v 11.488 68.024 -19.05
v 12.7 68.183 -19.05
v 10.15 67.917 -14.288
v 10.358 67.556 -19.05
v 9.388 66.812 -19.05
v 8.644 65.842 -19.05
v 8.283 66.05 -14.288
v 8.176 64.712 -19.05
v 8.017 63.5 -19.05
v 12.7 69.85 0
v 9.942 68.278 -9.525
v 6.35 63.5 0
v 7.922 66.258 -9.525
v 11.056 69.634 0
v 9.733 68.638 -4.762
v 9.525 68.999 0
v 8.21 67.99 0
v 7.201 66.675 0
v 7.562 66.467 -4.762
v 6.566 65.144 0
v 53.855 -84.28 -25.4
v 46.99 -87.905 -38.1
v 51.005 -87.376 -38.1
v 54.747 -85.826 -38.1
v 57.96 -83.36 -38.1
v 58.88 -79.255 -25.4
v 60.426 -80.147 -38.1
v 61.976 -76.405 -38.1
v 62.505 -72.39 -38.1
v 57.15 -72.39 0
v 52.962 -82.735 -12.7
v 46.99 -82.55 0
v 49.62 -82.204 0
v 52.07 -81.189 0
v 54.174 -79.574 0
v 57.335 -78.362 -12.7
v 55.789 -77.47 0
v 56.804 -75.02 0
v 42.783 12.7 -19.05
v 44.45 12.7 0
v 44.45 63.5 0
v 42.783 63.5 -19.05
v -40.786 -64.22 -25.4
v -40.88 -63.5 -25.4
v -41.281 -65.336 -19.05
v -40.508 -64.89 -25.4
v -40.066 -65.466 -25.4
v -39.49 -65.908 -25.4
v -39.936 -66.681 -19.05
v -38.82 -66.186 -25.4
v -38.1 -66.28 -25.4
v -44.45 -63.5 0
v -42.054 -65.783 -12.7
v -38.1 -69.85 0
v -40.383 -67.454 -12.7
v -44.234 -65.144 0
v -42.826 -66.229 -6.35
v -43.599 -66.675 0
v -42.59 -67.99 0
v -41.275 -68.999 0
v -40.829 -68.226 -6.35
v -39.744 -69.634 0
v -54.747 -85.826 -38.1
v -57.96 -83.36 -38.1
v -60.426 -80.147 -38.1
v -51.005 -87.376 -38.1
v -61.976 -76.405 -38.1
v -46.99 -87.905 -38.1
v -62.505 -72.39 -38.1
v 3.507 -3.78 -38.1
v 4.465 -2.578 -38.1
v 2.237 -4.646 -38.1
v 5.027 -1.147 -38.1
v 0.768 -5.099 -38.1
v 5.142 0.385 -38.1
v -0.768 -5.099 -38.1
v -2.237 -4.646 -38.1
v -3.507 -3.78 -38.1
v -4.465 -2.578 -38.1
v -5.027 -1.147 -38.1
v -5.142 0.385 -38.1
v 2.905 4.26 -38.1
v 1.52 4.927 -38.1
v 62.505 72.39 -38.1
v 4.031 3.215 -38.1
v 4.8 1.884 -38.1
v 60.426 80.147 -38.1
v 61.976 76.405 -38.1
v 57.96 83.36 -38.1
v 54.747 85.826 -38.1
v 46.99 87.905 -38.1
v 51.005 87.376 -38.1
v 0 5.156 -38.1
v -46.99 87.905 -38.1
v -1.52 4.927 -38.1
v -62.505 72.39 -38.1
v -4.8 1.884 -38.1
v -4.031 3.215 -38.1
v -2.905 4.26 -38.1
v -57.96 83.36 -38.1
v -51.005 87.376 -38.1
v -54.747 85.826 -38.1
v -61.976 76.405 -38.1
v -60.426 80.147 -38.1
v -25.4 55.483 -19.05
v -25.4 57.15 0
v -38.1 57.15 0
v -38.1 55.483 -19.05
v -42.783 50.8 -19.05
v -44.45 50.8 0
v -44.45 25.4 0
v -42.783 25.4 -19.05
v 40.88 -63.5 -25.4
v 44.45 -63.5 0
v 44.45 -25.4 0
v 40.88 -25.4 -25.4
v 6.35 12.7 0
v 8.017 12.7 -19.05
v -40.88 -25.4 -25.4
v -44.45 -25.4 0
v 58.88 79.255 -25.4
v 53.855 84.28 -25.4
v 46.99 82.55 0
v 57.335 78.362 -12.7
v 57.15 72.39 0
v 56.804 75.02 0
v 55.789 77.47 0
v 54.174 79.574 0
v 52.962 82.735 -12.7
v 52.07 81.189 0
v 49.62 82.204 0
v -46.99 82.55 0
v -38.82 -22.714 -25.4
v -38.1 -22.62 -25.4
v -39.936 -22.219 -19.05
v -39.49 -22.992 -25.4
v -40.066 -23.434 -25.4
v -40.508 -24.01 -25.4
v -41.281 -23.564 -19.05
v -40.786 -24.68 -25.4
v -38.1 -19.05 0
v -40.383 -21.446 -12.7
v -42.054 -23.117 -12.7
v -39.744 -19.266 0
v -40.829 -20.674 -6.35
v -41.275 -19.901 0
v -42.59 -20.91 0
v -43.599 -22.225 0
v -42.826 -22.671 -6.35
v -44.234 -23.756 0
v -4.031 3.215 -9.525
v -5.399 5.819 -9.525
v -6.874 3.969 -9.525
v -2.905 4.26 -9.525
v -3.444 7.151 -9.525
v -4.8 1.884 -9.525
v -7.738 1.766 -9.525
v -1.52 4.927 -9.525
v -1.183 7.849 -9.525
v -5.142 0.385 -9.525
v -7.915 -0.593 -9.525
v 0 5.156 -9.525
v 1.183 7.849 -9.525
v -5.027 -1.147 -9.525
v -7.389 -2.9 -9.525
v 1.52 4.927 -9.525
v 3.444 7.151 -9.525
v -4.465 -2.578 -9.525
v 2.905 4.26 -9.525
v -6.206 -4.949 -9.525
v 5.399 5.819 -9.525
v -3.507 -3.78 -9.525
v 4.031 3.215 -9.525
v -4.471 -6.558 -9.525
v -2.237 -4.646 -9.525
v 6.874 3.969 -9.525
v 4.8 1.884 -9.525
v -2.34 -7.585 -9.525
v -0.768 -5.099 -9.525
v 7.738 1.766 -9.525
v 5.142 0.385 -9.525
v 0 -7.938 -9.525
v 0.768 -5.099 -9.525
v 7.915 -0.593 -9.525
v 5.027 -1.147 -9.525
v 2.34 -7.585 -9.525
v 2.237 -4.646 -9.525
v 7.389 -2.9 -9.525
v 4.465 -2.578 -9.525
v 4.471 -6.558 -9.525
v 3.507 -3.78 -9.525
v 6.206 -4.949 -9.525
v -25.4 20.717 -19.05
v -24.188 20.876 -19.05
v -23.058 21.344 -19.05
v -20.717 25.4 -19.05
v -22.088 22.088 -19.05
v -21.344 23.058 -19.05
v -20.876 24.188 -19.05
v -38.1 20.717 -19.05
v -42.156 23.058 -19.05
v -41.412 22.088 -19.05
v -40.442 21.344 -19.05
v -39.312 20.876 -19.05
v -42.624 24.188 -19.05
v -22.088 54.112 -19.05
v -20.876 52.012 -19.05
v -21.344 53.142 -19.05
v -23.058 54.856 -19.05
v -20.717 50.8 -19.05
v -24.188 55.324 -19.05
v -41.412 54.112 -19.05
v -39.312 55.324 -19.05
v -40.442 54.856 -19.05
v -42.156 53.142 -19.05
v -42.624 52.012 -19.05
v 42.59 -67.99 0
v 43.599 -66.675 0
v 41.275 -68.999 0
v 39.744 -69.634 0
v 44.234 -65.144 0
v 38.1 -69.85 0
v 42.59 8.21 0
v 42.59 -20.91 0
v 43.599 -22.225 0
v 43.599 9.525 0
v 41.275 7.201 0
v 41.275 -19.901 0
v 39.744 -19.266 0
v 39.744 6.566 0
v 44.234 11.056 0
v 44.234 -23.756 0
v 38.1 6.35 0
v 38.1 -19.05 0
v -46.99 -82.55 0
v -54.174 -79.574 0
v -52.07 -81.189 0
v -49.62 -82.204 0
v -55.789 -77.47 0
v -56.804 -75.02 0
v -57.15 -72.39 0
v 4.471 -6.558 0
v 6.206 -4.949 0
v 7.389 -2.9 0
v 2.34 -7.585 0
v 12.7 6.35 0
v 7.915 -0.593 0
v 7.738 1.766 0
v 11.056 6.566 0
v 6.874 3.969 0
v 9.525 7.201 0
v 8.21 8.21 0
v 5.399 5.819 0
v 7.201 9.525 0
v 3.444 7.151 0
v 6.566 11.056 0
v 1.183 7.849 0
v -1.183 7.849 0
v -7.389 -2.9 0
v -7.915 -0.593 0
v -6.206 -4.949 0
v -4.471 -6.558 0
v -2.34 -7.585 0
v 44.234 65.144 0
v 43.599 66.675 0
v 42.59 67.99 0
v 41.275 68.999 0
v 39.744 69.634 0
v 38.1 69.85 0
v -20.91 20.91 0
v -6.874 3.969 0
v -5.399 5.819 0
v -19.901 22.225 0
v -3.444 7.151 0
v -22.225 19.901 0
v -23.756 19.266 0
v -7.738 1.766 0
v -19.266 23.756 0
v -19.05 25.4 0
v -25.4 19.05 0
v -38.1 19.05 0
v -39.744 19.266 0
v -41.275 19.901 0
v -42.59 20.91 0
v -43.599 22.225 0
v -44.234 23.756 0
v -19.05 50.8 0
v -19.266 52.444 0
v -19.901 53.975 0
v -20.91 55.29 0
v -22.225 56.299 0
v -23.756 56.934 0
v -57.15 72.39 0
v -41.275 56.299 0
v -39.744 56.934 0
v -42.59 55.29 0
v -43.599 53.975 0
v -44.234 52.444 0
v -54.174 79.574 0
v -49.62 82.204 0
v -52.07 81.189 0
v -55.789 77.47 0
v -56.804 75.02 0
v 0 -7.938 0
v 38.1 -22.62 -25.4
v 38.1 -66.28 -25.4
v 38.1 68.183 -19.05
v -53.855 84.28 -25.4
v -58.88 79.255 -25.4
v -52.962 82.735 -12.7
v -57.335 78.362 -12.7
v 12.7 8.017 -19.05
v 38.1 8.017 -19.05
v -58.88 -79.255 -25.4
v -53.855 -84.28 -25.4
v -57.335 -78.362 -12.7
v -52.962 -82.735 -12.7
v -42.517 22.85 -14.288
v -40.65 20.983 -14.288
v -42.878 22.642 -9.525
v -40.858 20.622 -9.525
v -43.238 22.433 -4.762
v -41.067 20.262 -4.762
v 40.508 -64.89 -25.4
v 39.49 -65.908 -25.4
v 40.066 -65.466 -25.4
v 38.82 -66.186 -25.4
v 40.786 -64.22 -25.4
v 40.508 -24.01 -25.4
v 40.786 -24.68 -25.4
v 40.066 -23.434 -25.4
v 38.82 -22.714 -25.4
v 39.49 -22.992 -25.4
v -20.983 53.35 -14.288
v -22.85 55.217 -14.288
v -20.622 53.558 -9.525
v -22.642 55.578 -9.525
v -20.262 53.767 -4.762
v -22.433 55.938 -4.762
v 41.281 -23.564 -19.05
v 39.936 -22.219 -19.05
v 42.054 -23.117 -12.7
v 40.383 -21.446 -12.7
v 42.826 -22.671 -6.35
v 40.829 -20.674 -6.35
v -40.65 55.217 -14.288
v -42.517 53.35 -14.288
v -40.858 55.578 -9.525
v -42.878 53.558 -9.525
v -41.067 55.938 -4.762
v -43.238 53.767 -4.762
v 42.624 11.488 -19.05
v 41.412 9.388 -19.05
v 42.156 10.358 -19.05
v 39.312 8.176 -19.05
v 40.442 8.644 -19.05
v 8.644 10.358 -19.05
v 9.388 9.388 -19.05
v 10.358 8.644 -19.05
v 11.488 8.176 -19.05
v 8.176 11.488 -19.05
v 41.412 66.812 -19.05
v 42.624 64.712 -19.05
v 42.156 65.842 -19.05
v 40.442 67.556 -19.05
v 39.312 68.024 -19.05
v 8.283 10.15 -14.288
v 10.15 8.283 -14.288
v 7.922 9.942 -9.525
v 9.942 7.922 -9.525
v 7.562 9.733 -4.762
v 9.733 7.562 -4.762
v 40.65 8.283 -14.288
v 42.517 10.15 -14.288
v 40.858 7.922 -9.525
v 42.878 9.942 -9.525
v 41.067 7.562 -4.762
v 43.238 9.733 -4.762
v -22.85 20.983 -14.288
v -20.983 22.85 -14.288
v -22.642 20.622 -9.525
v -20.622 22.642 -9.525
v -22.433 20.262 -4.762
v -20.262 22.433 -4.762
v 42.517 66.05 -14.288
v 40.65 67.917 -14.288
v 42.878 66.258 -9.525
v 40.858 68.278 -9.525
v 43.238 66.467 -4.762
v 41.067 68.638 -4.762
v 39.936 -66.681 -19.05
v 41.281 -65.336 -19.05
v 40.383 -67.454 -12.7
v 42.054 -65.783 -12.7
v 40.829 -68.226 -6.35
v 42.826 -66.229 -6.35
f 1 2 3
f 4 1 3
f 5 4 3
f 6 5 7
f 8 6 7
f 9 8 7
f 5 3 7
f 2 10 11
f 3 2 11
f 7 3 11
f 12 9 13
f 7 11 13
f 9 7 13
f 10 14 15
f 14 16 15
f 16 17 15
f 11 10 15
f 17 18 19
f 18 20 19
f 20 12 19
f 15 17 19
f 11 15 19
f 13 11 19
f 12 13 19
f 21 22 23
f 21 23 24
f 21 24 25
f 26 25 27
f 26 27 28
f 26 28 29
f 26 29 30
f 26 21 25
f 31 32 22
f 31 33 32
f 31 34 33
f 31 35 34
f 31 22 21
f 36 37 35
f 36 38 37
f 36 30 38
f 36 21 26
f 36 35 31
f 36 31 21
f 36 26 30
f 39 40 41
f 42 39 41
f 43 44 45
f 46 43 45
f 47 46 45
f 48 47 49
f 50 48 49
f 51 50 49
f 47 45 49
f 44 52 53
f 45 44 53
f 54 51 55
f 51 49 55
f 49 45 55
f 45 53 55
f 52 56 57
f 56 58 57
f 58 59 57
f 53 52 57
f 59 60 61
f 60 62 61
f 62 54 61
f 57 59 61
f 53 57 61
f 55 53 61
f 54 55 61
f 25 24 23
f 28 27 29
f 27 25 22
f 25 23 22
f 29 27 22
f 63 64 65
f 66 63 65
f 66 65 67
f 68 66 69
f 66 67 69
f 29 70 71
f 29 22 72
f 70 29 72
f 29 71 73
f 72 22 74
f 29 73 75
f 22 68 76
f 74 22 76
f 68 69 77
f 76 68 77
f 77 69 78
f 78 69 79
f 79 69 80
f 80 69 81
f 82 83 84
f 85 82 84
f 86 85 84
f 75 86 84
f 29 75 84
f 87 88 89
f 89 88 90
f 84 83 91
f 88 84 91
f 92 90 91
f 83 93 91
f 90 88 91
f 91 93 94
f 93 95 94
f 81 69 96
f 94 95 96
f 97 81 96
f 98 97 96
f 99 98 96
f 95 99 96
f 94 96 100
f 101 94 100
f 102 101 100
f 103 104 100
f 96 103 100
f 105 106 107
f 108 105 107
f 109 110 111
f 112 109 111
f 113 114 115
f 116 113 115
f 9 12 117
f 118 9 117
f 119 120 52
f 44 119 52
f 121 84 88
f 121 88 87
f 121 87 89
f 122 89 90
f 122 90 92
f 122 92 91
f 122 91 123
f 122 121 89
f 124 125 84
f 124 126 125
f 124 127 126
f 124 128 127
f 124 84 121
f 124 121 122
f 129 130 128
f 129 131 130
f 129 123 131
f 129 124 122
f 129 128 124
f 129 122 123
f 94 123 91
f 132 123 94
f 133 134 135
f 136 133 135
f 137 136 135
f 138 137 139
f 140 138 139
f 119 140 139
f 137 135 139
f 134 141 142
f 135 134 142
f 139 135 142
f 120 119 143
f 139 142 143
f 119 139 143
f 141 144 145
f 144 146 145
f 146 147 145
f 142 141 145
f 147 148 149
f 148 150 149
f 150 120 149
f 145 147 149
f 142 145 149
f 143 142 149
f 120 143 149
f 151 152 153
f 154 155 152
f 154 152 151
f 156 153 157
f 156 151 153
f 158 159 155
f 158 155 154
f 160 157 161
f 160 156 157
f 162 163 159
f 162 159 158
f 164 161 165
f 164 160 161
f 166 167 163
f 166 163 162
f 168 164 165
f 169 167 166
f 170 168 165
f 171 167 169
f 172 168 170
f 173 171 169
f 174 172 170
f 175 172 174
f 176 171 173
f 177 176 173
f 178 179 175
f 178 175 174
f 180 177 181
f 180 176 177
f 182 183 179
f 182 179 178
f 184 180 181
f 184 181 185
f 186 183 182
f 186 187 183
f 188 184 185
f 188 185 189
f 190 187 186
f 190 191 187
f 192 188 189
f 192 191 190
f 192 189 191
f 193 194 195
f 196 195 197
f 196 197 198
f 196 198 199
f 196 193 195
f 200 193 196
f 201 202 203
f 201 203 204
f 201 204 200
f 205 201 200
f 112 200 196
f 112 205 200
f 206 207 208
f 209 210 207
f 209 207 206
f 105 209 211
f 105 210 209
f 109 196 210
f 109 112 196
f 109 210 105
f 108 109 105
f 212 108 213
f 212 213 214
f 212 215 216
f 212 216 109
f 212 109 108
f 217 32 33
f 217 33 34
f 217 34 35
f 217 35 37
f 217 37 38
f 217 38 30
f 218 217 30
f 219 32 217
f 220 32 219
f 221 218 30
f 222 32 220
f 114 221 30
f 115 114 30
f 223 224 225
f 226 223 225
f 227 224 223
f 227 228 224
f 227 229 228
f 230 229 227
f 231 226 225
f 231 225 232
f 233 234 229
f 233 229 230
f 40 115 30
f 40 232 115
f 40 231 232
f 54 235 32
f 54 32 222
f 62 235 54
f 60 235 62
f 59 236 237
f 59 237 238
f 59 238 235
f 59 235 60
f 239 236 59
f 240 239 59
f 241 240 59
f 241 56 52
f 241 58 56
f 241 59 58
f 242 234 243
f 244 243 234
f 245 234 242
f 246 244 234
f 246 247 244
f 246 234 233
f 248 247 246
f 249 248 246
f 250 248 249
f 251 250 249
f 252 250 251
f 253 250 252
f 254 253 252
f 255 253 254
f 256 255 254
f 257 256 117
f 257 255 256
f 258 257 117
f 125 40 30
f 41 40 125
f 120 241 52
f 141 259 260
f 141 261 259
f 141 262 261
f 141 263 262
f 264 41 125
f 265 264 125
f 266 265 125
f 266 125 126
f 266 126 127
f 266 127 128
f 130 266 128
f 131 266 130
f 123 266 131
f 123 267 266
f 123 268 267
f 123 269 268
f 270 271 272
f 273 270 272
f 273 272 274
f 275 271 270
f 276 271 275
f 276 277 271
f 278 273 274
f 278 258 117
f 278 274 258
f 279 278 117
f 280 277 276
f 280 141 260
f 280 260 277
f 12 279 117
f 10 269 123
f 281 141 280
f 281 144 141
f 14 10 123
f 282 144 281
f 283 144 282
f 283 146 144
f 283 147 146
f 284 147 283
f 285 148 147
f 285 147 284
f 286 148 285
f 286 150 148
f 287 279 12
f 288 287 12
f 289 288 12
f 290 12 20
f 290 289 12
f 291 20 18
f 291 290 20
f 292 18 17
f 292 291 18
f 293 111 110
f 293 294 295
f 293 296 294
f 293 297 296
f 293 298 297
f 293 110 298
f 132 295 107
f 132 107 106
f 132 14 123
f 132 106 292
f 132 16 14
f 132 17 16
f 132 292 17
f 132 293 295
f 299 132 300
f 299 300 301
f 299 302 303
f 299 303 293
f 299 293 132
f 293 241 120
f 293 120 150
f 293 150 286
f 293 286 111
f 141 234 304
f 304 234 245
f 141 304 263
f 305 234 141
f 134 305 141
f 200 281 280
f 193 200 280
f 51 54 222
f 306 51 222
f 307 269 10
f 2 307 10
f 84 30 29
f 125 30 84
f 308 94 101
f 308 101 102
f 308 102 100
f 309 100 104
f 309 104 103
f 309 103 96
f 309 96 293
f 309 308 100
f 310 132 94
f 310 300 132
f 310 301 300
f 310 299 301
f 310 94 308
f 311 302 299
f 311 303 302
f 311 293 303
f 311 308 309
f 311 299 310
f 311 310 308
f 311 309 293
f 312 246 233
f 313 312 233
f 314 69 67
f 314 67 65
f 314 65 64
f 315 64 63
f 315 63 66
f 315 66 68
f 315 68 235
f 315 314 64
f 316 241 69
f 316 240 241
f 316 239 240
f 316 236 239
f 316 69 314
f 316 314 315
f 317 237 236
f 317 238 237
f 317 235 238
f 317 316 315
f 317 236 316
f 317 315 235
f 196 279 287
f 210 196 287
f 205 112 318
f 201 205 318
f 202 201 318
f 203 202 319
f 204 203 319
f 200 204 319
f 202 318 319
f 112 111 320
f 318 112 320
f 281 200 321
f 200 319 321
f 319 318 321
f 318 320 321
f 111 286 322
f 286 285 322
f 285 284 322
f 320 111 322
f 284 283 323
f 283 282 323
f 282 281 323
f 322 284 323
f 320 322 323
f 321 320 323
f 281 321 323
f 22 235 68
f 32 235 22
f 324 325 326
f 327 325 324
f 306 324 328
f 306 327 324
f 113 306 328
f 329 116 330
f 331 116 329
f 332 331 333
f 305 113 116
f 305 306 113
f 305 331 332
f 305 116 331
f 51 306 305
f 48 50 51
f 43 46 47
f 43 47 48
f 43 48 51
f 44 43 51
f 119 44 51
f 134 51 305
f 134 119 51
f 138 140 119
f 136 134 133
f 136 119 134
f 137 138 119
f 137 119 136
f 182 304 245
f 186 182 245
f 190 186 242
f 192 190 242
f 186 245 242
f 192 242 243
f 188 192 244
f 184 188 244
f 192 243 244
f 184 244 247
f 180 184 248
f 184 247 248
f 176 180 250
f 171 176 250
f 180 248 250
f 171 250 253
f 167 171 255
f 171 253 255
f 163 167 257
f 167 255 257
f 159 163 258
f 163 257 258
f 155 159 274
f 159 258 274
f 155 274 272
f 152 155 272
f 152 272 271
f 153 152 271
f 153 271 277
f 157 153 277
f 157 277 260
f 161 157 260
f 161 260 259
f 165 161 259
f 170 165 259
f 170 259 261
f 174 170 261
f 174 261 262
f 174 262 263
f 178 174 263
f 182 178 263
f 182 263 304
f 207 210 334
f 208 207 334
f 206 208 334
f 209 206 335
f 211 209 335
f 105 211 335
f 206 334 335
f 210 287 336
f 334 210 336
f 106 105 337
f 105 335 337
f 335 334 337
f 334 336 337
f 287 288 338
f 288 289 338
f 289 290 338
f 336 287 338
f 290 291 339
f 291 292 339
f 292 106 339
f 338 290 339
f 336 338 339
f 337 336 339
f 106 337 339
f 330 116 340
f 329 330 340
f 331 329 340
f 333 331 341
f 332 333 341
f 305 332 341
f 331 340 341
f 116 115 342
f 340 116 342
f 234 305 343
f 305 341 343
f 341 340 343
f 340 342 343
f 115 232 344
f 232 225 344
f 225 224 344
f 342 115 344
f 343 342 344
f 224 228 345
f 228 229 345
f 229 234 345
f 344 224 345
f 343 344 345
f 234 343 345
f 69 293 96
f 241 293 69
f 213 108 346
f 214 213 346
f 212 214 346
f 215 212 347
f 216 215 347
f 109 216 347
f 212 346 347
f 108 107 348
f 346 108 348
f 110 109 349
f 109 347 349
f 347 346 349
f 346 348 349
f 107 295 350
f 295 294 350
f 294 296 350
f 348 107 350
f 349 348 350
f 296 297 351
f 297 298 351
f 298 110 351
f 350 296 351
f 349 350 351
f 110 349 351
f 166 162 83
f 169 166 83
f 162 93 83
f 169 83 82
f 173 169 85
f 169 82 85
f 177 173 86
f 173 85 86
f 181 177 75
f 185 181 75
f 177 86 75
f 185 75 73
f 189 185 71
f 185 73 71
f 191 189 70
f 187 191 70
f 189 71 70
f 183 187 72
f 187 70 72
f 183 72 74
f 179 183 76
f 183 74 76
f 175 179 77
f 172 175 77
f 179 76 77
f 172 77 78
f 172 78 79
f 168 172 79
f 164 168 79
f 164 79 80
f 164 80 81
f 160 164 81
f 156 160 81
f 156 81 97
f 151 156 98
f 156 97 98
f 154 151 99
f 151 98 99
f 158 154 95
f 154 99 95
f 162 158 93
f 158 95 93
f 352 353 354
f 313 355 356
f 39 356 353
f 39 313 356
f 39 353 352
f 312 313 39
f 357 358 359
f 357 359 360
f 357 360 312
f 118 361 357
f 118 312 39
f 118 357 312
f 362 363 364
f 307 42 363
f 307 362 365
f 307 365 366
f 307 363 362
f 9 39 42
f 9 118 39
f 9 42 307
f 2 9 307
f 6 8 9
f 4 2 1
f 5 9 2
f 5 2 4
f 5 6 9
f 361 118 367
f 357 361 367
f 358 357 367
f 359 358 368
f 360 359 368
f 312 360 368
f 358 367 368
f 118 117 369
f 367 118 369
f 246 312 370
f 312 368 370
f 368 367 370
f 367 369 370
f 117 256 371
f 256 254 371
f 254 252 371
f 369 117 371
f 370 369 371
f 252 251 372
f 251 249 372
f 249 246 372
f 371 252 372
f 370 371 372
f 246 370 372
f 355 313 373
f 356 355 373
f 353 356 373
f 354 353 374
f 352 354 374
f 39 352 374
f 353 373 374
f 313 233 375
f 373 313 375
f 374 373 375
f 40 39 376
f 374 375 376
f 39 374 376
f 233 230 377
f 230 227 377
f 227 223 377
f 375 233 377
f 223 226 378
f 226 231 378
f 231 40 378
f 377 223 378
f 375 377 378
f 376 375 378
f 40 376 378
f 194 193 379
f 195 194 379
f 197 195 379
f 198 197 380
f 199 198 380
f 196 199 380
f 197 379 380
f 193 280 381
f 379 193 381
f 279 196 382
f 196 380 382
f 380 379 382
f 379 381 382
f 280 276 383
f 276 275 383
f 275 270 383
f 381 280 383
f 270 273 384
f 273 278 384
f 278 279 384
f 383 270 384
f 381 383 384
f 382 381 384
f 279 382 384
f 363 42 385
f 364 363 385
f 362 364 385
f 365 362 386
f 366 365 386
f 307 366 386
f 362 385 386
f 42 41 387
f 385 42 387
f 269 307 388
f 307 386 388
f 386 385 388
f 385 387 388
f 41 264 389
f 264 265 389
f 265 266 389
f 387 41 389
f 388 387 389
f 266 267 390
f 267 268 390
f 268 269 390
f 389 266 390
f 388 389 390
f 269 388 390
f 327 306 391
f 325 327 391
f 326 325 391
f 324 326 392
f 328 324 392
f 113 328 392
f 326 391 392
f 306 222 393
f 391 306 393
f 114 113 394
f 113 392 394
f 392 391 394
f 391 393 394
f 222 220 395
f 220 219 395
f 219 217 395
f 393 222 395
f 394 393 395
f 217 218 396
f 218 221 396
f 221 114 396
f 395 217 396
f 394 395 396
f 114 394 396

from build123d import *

# Parameters (mm, degrees)
BOSS_EXTRUDE1_DEPTH                              = 38.1
BOSS_EXTRUDE1_DRAFT                              = 8
CUT_EXTRUDE1_DEPTH                               = 19.05
CUT_EXTRUDE1_DRAFT                               = -5
CUT_EXTRUDE1_PROFILE_2_DEPTH                     = 19.05
CUT_EXTRUDE1_PROFILE_2_DRAFT                     = -5
CUT_EXTRUDE2_DEPTH                               = 25.4
CUT_EXTRUDE2_DRAFT                               = -8
CBORE_FOR_3_8_SOCKET_HEAD_CAP_SCREW1_D           = 10.3124
CBORE_FOR_3_8_SOCKET_HEAD_CAP_SCREW1_CBORE_D     = 15.875
CBORE_FOR_3_8_SOCKET_HEAD_CAP_SCREW1_CBORE_DEPTH = 9.525


with BuildPart() as part:
    # Sketch1 → Boss-Extrude1 (with draft: the straight prism first)
    with BuildSketch(Plane(origin=(0, 0, 0), x_dir=(0, 1, 0), z_dir=(0, 0, 1))):
        with BuildLine():
            ThreePointArc((-72.39, 57.15), (-79.574204897, 54.174204897), (-82.55, 46.99))
            Line((-82.55, 46.99), (-82.55, -46.99))
            ThreePointArc((-82.55, -46.99), (-79.574204897, -54.174204897), (-72.39, -57.15))
            Line((-72.39, -57.15), (72.39, -57.15))
            ThreePointArc((72.39, -57.15), (79.574204897, -54.174204897), (82.55, -46.99))
            Line((82.55, -46.99), (82.55, 46.99))
            ThreePointArc((82.55, 46.99), (79.574204897, 54.174204897), (72.39, 57.15))
            Line((72.39, 57.15), (-72.39, 57.15))
        make_face()
    extrude(amount=-BOSS_EXTRUDE1_DEPTH)
    # Boss-Extrude1: the draft: its side faces are tilted about the plane it starts from
    boss_extrude1_sides = [part.faces().sort_by_distance(p)[0] for p in [
        (-57.15, 0, -19.05),
        (-54.174204897, -79.574204897, -19.05),
        (0, -82.55, -19.05),
        (54.174204897, -79.574204897, -19.05),
        (57.15, 0, -19.05),
        (54.174204897, 79.574204897, -19.05),
        (0, 82.55, -19.05),
        (-54.174204897, 79.574204897, -19.05),
    ]]
    draft(boss_extrude1_sides, Plane(origin=(0, 0, 0), x_dir=(0, 1, 0), z_dir=(0, 0, 1)), BOSS_EXTRUDE1_DRAFT)


with BuildPart() as cut_extrude1_tool:
    # Sketch4 → Cut-Extrude1 (with draft: the straight prism first)
    with BuildSketch(Plane(origin=(0, 0, 0), x_dir=(0, 1, 0), z_dir=(0, 0, 1))):
        with BuildLine():
            Line((25.4, 19.05), (50.8, 19.05))
            ThreePointArc((50.8, 19.05), (55.290128061, 20.909871939), (57.15, 25.4))
            Line((57.15, 25.4), (57.15, 38.1))
            ThreePointArc((57.15, 38.1), (55.290128061, 42.590128061), (50.8, 44.45))
            Line((50.8, 44.45), (25.4, 44.45))
            ThreePointArc((25.4, 44.45), (20.909871939, 42.590128061), (19.05, 38.1))
            Line((19.05, 38.1), (19.05, 25.4))
            ThreePointArc((19.05, 25.4), (20.909871939, 20.909871939), (25.4, 19.05))
        make_face()
    extrude(amount=-CUT_EXTRUDE1_DEPTH)
    # Cut-Extrude1: the draft: its side faces are tilted about the plane it starts from
    cut_extrude1_sides = [cut_extrude1_tool.faces().sort_by_distance(p)[0] for p in [
        (-20.909871939, 20.909871939, -9.525),
        (-19.05, 38.1, -9.525),
        (-20.909871939, 55.290128061, -9.525),
        (-31.75, 57.15, -9.525),
        (-42.590128061, 55.290128061, -9.525),
        (-44.45, 38.1, -9.525),
        (-42.590128061, 20.909871939, -9.525),
        (-31.75, 19.05, -9.525),
    ]]
    draft(cut_extrude1_sides, Plane(origin=(0, 0, 0), x_dir=(0, 1, 0), z_dir=(0, 0, 1)), CUT_EXTRUDE1_DRAFT)


with BuildPart() as part_1:
    add(part.part)

    # Cut-Extrude1: cut by cut_extrude1_tool
    add(cut_extrude1_tool.part, mode=Mode.SUBTRACT)


with BuildPart() as cut_extrude1_profile_2_tool:
    # Sketch4 → Cut-Extrude1 profile 2 (with draft: the straight prism first)
    with BuildSketch(Plane(origin=(0, 0, 0), x_dir=(0, 1, 0), z_dir=(0, 0, 1))):
        with BuildLine():
            Line((6.35, -12.7), (6.35, -38.1))
            ThreePointArc((6.35, -38.1), (8.209871939, -42.590128061), (12.7, -44.45))
            Line((12.7, -44.45), (63.5, -44.45))
            ThreePointArc((63.5, -44.45), (67.990128061, -42.590128061), (69.85, -38.1))
            Line((69.85, -38.1), (69.85, -12.7))
            ThreePointArc((69.85, -12.7), (67.990128061, -8.209871939), (63.5, -6.35))
            Line((63.5, -6.35), (12.7, -6.35))
            ThreePointArc((12.7, -6.35), (8.209871939, -8.209871939), (6.35, -12.7))
        make_face()
    extrude(amount=-CUT_EXTRUDE1_PROFILE_2_DEPTH)
    # Cut-Extrude1 profile 2: the draft: its side faces are tilted about the plane it starts from
    cut_extrude1_profile_2_sides = [cut_extrude1_profile_2_tool.faces().sort_by_distance(p)[0] for p in [
        (25.4, 6.35, -9.525),
        (42.590128061, 8.209871939, -9.525),
        (44.45, 38.1, -9.525),
        (42.590128061, 67.990128061, -9.525),
        (25.4, 69.85, -9.525),
        (8.209871939, 67.990128061, -9.525),
        (6.35, 38.1, -9.525),
        (8.209871939, 8.209871939, -9.525),
    ]]
    draft(cut_extrude1_profile_2_sides, Plane(origin=(0, 0, 0), x_dir=(0, 1, 0), z_dir=(0, 0, 1)), CUT_EXTRUDE1_PROFILE_2_DRAFT)


with BuildPart() as part_2:
    add(part_1.part)

    # Cut-Extrude1 profile 2: cut by cut_extrude1_profile_2_tool
    add(cut_extrude1_profile_2_tool.part, mode=Mode.SUBTRACT)


with BuildPart() as cut_extrude2_tool:
    # Sketch4<3> → Cut-Extrude2 (with draft: the straight prism first)
    with BuildSketch(Plane(origin=(0, 0, 0), x_dir=(0, 1, 0), z_dir=(0, 0, 1))):
        with BuildLine():
            ThreePointArc((-63.5, 44.45), (-67.990128061, 42.590128061), (-69.85, 38.1))
            Line((-69.85, 38.1), (-69.85, -38.1))
            ThreePointArc((-69.85, -38.1), (-67.990128061, -42.590128061), (-63.5, -44.45))
            Line((-63.5, -44.45), (-25.4, -44.45))
            ThreePointArc((-25.4, -44.45), (-20.909871939, -42.590128061), (-19.05, -38.1))
            Line((-19.05, -38.1), (-19.05, 38.1))
            ThreePointArc((-19.05, 38.1), (-20.909871939, 42.590128061), (-25.4, 44.45))
            Line((-25.4, 44.45), (-63.5, 44.45))
        make_face()
    extrude(amount=-CUT_EXTRUDE2_DEPTH)
    # Cut-Extrude2: the draft: its side faces are tilted about the plane it starts from
    cut_extrude2_sides = [cut_extrude2_tool.faces().sort_by_distance(p)[0] for p in [
        (-42.590128061, -20.909871939, -12.7),
        (-44.45, -44.45, -12.7),
        (-42.590128061, -67.990128061, -12.7),
        (0, -69.85, -12.7),
        (42.590128061, -67.990128061, -12.7),
        (44.45, -44.45, -12.7),
        (42.590128061, -20.909871939, -12.7),
        (0, -19.05, -12.7),
    ]]
    draft(cut_extrude2_sides, Plane(origin=(0, 0, 0), x_dir=(0, 1, 0), z_dir=(0, 0, 1)), CUT_EXTRUDE2_DRAFT)


with BuildPart() as part_3:
    add(part_2.part)

    # Cut-Extrude2: cut by cut_extrude2_tool
    add(cut_extrude2_tool.part, mode=Mode.SUBTRACT)

    # CBORE for 3/8 Socket Head Cap Screw1 (through all)
    with Locations(Plane(origin=(0, 0, 0), x_dir=(0, -1, 0), z_dir=(0, 0, 1))):
        with Locations((0, 0)):
            CounterBoreHole(CBORE_FOR_3_8_SOCKET_HEAD_CAP_SCREW1_D / 2, CBORE_FOR_3_8_SOCKET_HEAD_CAP_SCREW1_CBORE_D / 2, CBORE_FOR_3_8_SOCKET_HEAD_CAP_SCREW1_CBORE_DEPTH)


solid = part_3.part
